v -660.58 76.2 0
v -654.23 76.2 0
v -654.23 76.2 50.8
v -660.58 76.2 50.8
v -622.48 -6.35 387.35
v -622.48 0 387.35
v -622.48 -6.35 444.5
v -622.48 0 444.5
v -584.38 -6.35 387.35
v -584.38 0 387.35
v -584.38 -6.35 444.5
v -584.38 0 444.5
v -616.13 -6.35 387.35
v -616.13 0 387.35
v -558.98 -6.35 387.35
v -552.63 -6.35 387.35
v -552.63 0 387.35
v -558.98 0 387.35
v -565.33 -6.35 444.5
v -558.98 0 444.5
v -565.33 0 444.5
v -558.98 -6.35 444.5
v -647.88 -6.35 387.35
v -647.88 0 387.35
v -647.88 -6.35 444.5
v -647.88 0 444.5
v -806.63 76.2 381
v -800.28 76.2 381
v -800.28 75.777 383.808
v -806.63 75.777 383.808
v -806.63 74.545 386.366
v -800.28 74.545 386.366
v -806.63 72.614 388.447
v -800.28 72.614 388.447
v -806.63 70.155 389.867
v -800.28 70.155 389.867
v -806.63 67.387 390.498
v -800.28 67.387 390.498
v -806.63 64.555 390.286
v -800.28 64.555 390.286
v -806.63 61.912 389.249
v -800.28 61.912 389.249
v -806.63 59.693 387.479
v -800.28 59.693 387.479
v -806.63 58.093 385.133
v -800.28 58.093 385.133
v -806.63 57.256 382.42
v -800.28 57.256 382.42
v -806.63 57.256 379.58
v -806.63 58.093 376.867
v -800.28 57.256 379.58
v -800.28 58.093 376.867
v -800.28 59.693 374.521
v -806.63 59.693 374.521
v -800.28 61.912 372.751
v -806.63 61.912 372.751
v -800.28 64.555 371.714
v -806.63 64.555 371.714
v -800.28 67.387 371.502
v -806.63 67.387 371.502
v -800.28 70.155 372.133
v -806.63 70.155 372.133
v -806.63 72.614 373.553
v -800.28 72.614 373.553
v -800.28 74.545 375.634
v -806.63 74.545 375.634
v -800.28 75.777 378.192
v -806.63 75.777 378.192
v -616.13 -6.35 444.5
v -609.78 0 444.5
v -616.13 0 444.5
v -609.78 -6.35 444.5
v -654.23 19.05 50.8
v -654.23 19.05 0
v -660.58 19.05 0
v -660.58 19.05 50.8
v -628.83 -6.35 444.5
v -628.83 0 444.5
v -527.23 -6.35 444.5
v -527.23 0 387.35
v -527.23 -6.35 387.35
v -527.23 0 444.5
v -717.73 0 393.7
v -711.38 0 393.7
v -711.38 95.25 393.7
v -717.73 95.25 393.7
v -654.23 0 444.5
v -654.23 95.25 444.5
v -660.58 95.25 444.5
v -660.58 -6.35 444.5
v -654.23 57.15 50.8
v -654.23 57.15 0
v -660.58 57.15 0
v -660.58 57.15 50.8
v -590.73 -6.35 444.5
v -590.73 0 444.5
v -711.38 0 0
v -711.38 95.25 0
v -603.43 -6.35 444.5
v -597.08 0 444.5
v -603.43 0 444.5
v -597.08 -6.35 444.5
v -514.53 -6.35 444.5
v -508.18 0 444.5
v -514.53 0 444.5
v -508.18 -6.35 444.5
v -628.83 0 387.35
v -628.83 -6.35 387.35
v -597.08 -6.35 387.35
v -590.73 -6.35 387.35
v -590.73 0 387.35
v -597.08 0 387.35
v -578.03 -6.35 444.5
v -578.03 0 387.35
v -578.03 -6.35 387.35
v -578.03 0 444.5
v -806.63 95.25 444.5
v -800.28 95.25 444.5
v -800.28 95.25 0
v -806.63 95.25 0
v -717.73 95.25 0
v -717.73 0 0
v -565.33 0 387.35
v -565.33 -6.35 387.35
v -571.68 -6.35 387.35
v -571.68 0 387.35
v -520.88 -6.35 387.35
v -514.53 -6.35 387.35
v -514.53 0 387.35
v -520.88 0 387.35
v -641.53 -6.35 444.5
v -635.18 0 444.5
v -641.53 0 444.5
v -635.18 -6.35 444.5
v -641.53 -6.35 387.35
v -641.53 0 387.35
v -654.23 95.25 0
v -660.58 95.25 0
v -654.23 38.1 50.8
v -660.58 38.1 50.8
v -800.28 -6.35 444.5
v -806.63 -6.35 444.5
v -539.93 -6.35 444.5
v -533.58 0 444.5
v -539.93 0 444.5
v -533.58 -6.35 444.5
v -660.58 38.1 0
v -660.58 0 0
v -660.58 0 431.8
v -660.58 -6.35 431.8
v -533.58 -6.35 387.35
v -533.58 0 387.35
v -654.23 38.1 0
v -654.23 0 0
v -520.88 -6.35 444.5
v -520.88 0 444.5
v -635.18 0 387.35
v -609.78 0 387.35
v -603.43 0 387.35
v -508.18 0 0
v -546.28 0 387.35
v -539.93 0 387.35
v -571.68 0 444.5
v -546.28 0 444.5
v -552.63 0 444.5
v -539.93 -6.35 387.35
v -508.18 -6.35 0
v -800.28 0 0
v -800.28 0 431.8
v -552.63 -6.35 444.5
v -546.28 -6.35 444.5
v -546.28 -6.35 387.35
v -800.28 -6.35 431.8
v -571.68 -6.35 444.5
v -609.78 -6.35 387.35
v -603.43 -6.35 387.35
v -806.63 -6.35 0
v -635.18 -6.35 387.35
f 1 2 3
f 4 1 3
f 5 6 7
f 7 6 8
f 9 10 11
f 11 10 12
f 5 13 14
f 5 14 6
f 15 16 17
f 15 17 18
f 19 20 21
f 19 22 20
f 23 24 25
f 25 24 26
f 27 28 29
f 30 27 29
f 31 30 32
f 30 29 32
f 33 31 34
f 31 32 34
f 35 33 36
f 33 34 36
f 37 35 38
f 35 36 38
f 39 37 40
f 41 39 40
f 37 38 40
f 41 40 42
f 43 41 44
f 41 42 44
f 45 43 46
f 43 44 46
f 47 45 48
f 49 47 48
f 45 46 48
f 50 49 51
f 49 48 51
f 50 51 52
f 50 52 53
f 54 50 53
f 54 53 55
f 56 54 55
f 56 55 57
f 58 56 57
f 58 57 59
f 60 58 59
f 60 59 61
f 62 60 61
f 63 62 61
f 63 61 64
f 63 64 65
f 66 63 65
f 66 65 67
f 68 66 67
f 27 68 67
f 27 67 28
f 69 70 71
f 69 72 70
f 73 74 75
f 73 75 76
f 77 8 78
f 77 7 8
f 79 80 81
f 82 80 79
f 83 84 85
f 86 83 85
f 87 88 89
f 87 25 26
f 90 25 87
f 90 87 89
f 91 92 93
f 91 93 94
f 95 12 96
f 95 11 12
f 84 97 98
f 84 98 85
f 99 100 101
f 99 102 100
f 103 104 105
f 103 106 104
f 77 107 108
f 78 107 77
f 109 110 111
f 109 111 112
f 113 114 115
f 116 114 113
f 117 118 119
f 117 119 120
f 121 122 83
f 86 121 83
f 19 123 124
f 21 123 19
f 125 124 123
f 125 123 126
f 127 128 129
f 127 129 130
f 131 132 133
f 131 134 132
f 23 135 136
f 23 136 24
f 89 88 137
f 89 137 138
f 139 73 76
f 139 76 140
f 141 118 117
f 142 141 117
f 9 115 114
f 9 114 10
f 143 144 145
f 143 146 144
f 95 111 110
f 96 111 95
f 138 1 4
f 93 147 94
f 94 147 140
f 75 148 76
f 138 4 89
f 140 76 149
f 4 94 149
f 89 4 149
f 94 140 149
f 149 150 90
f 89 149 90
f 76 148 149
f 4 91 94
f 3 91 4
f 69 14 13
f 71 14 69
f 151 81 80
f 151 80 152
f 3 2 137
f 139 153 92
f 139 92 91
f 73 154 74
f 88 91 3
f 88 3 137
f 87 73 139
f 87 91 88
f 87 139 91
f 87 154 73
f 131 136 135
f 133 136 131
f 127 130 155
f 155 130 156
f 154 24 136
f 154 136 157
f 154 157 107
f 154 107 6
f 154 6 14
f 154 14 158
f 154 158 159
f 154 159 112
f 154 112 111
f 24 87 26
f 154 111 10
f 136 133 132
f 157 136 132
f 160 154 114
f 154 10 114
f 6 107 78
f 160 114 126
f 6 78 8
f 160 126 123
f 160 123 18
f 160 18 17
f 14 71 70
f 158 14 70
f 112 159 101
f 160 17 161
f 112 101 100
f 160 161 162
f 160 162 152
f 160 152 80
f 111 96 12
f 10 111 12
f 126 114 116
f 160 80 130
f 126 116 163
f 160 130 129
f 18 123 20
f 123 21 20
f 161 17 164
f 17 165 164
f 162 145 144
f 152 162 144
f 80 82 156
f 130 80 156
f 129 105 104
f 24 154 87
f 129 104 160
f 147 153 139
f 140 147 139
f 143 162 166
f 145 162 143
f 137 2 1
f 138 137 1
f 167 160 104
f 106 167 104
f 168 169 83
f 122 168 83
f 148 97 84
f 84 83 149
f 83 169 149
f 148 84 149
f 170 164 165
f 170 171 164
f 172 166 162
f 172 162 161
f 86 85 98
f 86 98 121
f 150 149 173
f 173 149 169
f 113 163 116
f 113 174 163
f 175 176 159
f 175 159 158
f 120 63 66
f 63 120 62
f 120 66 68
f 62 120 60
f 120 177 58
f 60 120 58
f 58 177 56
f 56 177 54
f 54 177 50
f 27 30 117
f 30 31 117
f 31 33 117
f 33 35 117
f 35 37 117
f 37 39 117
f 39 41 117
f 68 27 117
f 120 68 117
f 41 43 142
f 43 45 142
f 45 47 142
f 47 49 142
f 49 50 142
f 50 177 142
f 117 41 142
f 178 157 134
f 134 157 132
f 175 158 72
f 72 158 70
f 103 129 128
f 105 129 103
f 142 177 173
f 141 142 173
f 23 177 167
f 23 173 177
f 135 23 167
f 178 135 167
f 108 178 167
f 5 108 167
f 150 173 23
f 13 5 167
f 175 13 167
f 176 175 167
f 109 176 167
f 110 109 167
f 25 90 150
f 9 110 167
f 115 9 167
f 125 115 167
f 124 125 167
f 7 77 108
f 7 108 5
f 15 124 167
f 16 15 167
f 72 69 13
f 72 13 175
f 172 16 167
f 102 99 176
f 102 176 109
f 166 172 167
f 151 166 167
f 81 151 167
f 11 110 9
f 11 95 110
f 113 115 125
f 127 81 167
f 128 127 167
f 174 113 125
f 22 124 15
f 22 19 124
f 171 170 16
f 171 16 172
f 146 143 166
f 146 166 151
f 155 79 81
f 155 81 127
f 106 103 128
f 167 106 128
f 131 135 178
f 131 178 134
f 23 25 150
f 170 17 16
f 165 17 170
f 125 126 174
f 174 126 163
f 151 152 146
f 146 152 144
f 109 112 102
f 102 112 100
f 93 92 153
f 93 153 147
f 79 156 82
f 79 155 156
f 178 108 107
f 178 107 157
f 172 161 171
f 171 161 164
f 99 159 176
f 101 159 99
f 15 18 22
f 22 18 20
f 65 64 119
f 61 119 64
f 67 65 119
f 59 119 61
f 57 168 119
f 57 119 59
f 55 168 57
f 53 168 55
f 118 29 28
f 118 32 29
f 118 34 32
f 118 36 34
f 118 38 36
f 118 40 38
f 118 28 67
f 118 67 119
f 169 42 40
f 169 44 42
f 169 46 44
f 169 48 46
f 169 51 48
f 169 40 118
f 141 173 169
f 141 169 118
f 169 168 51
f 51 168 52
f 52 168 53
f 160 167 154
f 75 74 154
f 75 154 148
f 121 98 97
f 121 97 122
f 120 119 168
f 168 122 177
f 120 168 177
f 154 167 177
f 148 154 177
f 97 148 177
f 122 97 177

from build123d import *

# Parameters (mm, degrees)
F0_W      = 298.45
F0_H      = 444.5
F1_DEPTH  = 6.35
F2_W      = 6.35
F2_H      = 444.5
F3_DEPTH  = 95.25
F4_W      = 6.35
F4_H      = 57.15
F5_DEPTH  = 6.351
F6_W      = 6.35
F6_H      = 444.5
F7_DEPTH  = 95.25
F8_W      = 19.05
F8_H      = 50.8
F9_W      = 95.25
F9_H      = 50.8
F10_DEPTH = 25.4
F11_W     = 139.7
F11_H     = 12.7
F12_DEPTH = 25.4
F13_R     = 9.525
F14_DEPTH = 25.4


with BuildPart() as f1:
    # F0 (on Front) → F1 (new body)
    with BuildSketch(Plane.XZ):
        with Locations((-657.405383, 222.25)):
            Rectangle(F0_W, F0_H)
    extrude(amount=F1_DEPTH)

    # F2 (on face) → F3 (join)
    with BuildSketch(Plane(origin=(0, 0, 0), x_dir=(-1, 0, 0), z_dir=(0, 1, 0))):
        with Locations((803.455383, 222.25)):
            Rectangle(F2_W, F2_H)
    extrude(amount=F3_DEPTH)

    # F4 (on face) → F5 (cut, through all)
    with BuildSketch(Plane(origin=(0, 0, 0), x_dir=(-1, 0, 0), z_dir=(0, 1, 0))):
        with Locations((517.705383, 415.925)):
            Rectangle(F4_W, F4_H)
        with Locations((530.405383, 415.925)):
            Rectangle(F4_W, F4_H)
        with Locations((543.105383, 415.925)):
            Rectangle(F4_W, F4_H)
        with Locations((555.805383, 415.925)):
            Rectangle(F4_W, F4_H)
        with Locations((568.505383, 415.925)):
            Rectangle(F4_W, F4_H)
        with Locations((581.205383, 415.925)):
            Rectangle(F4_W, F4_H)
        with Locations((593.905383, 415.925)):
            Rectangle(F4_W, F4_H)
        with Locations((606.605383, 415.925)):
            Rectangle(F4_W, F4_H)
        with Locations((619.305383, 415.925)):
            Rectangle(F4_W, F4_H)
        with Locations((632.005383, 415.925)):
            Rectangle(F4_W, F4_H)
        with Locations((644.705383, 415.925)):
            Rectangle(F4_W, F4_H)
    extrude(amount=-F5_DEPTH, mode=Mode.SUBTRACT)

    # F6 (on face) → F7 (join)
    with BuildSketch(Plane(origin=(0, 0, 0), x_dir=(-1, 0, 0), z_dir=(0, 1, 0))):
        with Locations((657.405383, 222.25)):
            Rectangle(F6_W, F6_H)
        with Locations((714.555383, 222.25)):
            Rectangle(F6_W, F6_H)
    extrude(amount=F7_DEPTH)

    # F8 (on face) + F9 (on face) → F10 (cut)
    with BuildSketch(Plane.YZ.offset(-654.230383)):
        with Locations((28.575, 25.4)):
            Rectangle(F8_W, F8_H)
        with Locations((66.675, 25.4)):
            Rectangle(F8_W, F8_H)
    with BuildSketch(Plane.YZ.offset(-711.380383)):
        with Locations((47.625, 419.1)):
            Rectangle(F9_W, F9_H)
    extrude(amount=-F10_DEPTH, mode=Mode.SUBTRACT)

    # F11 (on face) → F12 (cut)
    with BuildSketch(Plane(origin=(0, 0, 0), x_dir=(-1, 0, 0), z_dir=(0, 1, 0))):
        with Locations((730.430383, 438.15)):
            Rectangle(F11_W, F11_H)
    extrude(amount=-F12_DEPTH, mode=Mode.SUBTRACT)

    # F13 (on face) → F14 (cut)
    with BuildSketch(Plane.YZ.offset(-800.280383)):
        with Locations((66.675, 381)):
            Circle(F13_R)
    extrude(amount=-F14_DEPTH, mode=Mode.SUBTRACT)


solid = f1.part
